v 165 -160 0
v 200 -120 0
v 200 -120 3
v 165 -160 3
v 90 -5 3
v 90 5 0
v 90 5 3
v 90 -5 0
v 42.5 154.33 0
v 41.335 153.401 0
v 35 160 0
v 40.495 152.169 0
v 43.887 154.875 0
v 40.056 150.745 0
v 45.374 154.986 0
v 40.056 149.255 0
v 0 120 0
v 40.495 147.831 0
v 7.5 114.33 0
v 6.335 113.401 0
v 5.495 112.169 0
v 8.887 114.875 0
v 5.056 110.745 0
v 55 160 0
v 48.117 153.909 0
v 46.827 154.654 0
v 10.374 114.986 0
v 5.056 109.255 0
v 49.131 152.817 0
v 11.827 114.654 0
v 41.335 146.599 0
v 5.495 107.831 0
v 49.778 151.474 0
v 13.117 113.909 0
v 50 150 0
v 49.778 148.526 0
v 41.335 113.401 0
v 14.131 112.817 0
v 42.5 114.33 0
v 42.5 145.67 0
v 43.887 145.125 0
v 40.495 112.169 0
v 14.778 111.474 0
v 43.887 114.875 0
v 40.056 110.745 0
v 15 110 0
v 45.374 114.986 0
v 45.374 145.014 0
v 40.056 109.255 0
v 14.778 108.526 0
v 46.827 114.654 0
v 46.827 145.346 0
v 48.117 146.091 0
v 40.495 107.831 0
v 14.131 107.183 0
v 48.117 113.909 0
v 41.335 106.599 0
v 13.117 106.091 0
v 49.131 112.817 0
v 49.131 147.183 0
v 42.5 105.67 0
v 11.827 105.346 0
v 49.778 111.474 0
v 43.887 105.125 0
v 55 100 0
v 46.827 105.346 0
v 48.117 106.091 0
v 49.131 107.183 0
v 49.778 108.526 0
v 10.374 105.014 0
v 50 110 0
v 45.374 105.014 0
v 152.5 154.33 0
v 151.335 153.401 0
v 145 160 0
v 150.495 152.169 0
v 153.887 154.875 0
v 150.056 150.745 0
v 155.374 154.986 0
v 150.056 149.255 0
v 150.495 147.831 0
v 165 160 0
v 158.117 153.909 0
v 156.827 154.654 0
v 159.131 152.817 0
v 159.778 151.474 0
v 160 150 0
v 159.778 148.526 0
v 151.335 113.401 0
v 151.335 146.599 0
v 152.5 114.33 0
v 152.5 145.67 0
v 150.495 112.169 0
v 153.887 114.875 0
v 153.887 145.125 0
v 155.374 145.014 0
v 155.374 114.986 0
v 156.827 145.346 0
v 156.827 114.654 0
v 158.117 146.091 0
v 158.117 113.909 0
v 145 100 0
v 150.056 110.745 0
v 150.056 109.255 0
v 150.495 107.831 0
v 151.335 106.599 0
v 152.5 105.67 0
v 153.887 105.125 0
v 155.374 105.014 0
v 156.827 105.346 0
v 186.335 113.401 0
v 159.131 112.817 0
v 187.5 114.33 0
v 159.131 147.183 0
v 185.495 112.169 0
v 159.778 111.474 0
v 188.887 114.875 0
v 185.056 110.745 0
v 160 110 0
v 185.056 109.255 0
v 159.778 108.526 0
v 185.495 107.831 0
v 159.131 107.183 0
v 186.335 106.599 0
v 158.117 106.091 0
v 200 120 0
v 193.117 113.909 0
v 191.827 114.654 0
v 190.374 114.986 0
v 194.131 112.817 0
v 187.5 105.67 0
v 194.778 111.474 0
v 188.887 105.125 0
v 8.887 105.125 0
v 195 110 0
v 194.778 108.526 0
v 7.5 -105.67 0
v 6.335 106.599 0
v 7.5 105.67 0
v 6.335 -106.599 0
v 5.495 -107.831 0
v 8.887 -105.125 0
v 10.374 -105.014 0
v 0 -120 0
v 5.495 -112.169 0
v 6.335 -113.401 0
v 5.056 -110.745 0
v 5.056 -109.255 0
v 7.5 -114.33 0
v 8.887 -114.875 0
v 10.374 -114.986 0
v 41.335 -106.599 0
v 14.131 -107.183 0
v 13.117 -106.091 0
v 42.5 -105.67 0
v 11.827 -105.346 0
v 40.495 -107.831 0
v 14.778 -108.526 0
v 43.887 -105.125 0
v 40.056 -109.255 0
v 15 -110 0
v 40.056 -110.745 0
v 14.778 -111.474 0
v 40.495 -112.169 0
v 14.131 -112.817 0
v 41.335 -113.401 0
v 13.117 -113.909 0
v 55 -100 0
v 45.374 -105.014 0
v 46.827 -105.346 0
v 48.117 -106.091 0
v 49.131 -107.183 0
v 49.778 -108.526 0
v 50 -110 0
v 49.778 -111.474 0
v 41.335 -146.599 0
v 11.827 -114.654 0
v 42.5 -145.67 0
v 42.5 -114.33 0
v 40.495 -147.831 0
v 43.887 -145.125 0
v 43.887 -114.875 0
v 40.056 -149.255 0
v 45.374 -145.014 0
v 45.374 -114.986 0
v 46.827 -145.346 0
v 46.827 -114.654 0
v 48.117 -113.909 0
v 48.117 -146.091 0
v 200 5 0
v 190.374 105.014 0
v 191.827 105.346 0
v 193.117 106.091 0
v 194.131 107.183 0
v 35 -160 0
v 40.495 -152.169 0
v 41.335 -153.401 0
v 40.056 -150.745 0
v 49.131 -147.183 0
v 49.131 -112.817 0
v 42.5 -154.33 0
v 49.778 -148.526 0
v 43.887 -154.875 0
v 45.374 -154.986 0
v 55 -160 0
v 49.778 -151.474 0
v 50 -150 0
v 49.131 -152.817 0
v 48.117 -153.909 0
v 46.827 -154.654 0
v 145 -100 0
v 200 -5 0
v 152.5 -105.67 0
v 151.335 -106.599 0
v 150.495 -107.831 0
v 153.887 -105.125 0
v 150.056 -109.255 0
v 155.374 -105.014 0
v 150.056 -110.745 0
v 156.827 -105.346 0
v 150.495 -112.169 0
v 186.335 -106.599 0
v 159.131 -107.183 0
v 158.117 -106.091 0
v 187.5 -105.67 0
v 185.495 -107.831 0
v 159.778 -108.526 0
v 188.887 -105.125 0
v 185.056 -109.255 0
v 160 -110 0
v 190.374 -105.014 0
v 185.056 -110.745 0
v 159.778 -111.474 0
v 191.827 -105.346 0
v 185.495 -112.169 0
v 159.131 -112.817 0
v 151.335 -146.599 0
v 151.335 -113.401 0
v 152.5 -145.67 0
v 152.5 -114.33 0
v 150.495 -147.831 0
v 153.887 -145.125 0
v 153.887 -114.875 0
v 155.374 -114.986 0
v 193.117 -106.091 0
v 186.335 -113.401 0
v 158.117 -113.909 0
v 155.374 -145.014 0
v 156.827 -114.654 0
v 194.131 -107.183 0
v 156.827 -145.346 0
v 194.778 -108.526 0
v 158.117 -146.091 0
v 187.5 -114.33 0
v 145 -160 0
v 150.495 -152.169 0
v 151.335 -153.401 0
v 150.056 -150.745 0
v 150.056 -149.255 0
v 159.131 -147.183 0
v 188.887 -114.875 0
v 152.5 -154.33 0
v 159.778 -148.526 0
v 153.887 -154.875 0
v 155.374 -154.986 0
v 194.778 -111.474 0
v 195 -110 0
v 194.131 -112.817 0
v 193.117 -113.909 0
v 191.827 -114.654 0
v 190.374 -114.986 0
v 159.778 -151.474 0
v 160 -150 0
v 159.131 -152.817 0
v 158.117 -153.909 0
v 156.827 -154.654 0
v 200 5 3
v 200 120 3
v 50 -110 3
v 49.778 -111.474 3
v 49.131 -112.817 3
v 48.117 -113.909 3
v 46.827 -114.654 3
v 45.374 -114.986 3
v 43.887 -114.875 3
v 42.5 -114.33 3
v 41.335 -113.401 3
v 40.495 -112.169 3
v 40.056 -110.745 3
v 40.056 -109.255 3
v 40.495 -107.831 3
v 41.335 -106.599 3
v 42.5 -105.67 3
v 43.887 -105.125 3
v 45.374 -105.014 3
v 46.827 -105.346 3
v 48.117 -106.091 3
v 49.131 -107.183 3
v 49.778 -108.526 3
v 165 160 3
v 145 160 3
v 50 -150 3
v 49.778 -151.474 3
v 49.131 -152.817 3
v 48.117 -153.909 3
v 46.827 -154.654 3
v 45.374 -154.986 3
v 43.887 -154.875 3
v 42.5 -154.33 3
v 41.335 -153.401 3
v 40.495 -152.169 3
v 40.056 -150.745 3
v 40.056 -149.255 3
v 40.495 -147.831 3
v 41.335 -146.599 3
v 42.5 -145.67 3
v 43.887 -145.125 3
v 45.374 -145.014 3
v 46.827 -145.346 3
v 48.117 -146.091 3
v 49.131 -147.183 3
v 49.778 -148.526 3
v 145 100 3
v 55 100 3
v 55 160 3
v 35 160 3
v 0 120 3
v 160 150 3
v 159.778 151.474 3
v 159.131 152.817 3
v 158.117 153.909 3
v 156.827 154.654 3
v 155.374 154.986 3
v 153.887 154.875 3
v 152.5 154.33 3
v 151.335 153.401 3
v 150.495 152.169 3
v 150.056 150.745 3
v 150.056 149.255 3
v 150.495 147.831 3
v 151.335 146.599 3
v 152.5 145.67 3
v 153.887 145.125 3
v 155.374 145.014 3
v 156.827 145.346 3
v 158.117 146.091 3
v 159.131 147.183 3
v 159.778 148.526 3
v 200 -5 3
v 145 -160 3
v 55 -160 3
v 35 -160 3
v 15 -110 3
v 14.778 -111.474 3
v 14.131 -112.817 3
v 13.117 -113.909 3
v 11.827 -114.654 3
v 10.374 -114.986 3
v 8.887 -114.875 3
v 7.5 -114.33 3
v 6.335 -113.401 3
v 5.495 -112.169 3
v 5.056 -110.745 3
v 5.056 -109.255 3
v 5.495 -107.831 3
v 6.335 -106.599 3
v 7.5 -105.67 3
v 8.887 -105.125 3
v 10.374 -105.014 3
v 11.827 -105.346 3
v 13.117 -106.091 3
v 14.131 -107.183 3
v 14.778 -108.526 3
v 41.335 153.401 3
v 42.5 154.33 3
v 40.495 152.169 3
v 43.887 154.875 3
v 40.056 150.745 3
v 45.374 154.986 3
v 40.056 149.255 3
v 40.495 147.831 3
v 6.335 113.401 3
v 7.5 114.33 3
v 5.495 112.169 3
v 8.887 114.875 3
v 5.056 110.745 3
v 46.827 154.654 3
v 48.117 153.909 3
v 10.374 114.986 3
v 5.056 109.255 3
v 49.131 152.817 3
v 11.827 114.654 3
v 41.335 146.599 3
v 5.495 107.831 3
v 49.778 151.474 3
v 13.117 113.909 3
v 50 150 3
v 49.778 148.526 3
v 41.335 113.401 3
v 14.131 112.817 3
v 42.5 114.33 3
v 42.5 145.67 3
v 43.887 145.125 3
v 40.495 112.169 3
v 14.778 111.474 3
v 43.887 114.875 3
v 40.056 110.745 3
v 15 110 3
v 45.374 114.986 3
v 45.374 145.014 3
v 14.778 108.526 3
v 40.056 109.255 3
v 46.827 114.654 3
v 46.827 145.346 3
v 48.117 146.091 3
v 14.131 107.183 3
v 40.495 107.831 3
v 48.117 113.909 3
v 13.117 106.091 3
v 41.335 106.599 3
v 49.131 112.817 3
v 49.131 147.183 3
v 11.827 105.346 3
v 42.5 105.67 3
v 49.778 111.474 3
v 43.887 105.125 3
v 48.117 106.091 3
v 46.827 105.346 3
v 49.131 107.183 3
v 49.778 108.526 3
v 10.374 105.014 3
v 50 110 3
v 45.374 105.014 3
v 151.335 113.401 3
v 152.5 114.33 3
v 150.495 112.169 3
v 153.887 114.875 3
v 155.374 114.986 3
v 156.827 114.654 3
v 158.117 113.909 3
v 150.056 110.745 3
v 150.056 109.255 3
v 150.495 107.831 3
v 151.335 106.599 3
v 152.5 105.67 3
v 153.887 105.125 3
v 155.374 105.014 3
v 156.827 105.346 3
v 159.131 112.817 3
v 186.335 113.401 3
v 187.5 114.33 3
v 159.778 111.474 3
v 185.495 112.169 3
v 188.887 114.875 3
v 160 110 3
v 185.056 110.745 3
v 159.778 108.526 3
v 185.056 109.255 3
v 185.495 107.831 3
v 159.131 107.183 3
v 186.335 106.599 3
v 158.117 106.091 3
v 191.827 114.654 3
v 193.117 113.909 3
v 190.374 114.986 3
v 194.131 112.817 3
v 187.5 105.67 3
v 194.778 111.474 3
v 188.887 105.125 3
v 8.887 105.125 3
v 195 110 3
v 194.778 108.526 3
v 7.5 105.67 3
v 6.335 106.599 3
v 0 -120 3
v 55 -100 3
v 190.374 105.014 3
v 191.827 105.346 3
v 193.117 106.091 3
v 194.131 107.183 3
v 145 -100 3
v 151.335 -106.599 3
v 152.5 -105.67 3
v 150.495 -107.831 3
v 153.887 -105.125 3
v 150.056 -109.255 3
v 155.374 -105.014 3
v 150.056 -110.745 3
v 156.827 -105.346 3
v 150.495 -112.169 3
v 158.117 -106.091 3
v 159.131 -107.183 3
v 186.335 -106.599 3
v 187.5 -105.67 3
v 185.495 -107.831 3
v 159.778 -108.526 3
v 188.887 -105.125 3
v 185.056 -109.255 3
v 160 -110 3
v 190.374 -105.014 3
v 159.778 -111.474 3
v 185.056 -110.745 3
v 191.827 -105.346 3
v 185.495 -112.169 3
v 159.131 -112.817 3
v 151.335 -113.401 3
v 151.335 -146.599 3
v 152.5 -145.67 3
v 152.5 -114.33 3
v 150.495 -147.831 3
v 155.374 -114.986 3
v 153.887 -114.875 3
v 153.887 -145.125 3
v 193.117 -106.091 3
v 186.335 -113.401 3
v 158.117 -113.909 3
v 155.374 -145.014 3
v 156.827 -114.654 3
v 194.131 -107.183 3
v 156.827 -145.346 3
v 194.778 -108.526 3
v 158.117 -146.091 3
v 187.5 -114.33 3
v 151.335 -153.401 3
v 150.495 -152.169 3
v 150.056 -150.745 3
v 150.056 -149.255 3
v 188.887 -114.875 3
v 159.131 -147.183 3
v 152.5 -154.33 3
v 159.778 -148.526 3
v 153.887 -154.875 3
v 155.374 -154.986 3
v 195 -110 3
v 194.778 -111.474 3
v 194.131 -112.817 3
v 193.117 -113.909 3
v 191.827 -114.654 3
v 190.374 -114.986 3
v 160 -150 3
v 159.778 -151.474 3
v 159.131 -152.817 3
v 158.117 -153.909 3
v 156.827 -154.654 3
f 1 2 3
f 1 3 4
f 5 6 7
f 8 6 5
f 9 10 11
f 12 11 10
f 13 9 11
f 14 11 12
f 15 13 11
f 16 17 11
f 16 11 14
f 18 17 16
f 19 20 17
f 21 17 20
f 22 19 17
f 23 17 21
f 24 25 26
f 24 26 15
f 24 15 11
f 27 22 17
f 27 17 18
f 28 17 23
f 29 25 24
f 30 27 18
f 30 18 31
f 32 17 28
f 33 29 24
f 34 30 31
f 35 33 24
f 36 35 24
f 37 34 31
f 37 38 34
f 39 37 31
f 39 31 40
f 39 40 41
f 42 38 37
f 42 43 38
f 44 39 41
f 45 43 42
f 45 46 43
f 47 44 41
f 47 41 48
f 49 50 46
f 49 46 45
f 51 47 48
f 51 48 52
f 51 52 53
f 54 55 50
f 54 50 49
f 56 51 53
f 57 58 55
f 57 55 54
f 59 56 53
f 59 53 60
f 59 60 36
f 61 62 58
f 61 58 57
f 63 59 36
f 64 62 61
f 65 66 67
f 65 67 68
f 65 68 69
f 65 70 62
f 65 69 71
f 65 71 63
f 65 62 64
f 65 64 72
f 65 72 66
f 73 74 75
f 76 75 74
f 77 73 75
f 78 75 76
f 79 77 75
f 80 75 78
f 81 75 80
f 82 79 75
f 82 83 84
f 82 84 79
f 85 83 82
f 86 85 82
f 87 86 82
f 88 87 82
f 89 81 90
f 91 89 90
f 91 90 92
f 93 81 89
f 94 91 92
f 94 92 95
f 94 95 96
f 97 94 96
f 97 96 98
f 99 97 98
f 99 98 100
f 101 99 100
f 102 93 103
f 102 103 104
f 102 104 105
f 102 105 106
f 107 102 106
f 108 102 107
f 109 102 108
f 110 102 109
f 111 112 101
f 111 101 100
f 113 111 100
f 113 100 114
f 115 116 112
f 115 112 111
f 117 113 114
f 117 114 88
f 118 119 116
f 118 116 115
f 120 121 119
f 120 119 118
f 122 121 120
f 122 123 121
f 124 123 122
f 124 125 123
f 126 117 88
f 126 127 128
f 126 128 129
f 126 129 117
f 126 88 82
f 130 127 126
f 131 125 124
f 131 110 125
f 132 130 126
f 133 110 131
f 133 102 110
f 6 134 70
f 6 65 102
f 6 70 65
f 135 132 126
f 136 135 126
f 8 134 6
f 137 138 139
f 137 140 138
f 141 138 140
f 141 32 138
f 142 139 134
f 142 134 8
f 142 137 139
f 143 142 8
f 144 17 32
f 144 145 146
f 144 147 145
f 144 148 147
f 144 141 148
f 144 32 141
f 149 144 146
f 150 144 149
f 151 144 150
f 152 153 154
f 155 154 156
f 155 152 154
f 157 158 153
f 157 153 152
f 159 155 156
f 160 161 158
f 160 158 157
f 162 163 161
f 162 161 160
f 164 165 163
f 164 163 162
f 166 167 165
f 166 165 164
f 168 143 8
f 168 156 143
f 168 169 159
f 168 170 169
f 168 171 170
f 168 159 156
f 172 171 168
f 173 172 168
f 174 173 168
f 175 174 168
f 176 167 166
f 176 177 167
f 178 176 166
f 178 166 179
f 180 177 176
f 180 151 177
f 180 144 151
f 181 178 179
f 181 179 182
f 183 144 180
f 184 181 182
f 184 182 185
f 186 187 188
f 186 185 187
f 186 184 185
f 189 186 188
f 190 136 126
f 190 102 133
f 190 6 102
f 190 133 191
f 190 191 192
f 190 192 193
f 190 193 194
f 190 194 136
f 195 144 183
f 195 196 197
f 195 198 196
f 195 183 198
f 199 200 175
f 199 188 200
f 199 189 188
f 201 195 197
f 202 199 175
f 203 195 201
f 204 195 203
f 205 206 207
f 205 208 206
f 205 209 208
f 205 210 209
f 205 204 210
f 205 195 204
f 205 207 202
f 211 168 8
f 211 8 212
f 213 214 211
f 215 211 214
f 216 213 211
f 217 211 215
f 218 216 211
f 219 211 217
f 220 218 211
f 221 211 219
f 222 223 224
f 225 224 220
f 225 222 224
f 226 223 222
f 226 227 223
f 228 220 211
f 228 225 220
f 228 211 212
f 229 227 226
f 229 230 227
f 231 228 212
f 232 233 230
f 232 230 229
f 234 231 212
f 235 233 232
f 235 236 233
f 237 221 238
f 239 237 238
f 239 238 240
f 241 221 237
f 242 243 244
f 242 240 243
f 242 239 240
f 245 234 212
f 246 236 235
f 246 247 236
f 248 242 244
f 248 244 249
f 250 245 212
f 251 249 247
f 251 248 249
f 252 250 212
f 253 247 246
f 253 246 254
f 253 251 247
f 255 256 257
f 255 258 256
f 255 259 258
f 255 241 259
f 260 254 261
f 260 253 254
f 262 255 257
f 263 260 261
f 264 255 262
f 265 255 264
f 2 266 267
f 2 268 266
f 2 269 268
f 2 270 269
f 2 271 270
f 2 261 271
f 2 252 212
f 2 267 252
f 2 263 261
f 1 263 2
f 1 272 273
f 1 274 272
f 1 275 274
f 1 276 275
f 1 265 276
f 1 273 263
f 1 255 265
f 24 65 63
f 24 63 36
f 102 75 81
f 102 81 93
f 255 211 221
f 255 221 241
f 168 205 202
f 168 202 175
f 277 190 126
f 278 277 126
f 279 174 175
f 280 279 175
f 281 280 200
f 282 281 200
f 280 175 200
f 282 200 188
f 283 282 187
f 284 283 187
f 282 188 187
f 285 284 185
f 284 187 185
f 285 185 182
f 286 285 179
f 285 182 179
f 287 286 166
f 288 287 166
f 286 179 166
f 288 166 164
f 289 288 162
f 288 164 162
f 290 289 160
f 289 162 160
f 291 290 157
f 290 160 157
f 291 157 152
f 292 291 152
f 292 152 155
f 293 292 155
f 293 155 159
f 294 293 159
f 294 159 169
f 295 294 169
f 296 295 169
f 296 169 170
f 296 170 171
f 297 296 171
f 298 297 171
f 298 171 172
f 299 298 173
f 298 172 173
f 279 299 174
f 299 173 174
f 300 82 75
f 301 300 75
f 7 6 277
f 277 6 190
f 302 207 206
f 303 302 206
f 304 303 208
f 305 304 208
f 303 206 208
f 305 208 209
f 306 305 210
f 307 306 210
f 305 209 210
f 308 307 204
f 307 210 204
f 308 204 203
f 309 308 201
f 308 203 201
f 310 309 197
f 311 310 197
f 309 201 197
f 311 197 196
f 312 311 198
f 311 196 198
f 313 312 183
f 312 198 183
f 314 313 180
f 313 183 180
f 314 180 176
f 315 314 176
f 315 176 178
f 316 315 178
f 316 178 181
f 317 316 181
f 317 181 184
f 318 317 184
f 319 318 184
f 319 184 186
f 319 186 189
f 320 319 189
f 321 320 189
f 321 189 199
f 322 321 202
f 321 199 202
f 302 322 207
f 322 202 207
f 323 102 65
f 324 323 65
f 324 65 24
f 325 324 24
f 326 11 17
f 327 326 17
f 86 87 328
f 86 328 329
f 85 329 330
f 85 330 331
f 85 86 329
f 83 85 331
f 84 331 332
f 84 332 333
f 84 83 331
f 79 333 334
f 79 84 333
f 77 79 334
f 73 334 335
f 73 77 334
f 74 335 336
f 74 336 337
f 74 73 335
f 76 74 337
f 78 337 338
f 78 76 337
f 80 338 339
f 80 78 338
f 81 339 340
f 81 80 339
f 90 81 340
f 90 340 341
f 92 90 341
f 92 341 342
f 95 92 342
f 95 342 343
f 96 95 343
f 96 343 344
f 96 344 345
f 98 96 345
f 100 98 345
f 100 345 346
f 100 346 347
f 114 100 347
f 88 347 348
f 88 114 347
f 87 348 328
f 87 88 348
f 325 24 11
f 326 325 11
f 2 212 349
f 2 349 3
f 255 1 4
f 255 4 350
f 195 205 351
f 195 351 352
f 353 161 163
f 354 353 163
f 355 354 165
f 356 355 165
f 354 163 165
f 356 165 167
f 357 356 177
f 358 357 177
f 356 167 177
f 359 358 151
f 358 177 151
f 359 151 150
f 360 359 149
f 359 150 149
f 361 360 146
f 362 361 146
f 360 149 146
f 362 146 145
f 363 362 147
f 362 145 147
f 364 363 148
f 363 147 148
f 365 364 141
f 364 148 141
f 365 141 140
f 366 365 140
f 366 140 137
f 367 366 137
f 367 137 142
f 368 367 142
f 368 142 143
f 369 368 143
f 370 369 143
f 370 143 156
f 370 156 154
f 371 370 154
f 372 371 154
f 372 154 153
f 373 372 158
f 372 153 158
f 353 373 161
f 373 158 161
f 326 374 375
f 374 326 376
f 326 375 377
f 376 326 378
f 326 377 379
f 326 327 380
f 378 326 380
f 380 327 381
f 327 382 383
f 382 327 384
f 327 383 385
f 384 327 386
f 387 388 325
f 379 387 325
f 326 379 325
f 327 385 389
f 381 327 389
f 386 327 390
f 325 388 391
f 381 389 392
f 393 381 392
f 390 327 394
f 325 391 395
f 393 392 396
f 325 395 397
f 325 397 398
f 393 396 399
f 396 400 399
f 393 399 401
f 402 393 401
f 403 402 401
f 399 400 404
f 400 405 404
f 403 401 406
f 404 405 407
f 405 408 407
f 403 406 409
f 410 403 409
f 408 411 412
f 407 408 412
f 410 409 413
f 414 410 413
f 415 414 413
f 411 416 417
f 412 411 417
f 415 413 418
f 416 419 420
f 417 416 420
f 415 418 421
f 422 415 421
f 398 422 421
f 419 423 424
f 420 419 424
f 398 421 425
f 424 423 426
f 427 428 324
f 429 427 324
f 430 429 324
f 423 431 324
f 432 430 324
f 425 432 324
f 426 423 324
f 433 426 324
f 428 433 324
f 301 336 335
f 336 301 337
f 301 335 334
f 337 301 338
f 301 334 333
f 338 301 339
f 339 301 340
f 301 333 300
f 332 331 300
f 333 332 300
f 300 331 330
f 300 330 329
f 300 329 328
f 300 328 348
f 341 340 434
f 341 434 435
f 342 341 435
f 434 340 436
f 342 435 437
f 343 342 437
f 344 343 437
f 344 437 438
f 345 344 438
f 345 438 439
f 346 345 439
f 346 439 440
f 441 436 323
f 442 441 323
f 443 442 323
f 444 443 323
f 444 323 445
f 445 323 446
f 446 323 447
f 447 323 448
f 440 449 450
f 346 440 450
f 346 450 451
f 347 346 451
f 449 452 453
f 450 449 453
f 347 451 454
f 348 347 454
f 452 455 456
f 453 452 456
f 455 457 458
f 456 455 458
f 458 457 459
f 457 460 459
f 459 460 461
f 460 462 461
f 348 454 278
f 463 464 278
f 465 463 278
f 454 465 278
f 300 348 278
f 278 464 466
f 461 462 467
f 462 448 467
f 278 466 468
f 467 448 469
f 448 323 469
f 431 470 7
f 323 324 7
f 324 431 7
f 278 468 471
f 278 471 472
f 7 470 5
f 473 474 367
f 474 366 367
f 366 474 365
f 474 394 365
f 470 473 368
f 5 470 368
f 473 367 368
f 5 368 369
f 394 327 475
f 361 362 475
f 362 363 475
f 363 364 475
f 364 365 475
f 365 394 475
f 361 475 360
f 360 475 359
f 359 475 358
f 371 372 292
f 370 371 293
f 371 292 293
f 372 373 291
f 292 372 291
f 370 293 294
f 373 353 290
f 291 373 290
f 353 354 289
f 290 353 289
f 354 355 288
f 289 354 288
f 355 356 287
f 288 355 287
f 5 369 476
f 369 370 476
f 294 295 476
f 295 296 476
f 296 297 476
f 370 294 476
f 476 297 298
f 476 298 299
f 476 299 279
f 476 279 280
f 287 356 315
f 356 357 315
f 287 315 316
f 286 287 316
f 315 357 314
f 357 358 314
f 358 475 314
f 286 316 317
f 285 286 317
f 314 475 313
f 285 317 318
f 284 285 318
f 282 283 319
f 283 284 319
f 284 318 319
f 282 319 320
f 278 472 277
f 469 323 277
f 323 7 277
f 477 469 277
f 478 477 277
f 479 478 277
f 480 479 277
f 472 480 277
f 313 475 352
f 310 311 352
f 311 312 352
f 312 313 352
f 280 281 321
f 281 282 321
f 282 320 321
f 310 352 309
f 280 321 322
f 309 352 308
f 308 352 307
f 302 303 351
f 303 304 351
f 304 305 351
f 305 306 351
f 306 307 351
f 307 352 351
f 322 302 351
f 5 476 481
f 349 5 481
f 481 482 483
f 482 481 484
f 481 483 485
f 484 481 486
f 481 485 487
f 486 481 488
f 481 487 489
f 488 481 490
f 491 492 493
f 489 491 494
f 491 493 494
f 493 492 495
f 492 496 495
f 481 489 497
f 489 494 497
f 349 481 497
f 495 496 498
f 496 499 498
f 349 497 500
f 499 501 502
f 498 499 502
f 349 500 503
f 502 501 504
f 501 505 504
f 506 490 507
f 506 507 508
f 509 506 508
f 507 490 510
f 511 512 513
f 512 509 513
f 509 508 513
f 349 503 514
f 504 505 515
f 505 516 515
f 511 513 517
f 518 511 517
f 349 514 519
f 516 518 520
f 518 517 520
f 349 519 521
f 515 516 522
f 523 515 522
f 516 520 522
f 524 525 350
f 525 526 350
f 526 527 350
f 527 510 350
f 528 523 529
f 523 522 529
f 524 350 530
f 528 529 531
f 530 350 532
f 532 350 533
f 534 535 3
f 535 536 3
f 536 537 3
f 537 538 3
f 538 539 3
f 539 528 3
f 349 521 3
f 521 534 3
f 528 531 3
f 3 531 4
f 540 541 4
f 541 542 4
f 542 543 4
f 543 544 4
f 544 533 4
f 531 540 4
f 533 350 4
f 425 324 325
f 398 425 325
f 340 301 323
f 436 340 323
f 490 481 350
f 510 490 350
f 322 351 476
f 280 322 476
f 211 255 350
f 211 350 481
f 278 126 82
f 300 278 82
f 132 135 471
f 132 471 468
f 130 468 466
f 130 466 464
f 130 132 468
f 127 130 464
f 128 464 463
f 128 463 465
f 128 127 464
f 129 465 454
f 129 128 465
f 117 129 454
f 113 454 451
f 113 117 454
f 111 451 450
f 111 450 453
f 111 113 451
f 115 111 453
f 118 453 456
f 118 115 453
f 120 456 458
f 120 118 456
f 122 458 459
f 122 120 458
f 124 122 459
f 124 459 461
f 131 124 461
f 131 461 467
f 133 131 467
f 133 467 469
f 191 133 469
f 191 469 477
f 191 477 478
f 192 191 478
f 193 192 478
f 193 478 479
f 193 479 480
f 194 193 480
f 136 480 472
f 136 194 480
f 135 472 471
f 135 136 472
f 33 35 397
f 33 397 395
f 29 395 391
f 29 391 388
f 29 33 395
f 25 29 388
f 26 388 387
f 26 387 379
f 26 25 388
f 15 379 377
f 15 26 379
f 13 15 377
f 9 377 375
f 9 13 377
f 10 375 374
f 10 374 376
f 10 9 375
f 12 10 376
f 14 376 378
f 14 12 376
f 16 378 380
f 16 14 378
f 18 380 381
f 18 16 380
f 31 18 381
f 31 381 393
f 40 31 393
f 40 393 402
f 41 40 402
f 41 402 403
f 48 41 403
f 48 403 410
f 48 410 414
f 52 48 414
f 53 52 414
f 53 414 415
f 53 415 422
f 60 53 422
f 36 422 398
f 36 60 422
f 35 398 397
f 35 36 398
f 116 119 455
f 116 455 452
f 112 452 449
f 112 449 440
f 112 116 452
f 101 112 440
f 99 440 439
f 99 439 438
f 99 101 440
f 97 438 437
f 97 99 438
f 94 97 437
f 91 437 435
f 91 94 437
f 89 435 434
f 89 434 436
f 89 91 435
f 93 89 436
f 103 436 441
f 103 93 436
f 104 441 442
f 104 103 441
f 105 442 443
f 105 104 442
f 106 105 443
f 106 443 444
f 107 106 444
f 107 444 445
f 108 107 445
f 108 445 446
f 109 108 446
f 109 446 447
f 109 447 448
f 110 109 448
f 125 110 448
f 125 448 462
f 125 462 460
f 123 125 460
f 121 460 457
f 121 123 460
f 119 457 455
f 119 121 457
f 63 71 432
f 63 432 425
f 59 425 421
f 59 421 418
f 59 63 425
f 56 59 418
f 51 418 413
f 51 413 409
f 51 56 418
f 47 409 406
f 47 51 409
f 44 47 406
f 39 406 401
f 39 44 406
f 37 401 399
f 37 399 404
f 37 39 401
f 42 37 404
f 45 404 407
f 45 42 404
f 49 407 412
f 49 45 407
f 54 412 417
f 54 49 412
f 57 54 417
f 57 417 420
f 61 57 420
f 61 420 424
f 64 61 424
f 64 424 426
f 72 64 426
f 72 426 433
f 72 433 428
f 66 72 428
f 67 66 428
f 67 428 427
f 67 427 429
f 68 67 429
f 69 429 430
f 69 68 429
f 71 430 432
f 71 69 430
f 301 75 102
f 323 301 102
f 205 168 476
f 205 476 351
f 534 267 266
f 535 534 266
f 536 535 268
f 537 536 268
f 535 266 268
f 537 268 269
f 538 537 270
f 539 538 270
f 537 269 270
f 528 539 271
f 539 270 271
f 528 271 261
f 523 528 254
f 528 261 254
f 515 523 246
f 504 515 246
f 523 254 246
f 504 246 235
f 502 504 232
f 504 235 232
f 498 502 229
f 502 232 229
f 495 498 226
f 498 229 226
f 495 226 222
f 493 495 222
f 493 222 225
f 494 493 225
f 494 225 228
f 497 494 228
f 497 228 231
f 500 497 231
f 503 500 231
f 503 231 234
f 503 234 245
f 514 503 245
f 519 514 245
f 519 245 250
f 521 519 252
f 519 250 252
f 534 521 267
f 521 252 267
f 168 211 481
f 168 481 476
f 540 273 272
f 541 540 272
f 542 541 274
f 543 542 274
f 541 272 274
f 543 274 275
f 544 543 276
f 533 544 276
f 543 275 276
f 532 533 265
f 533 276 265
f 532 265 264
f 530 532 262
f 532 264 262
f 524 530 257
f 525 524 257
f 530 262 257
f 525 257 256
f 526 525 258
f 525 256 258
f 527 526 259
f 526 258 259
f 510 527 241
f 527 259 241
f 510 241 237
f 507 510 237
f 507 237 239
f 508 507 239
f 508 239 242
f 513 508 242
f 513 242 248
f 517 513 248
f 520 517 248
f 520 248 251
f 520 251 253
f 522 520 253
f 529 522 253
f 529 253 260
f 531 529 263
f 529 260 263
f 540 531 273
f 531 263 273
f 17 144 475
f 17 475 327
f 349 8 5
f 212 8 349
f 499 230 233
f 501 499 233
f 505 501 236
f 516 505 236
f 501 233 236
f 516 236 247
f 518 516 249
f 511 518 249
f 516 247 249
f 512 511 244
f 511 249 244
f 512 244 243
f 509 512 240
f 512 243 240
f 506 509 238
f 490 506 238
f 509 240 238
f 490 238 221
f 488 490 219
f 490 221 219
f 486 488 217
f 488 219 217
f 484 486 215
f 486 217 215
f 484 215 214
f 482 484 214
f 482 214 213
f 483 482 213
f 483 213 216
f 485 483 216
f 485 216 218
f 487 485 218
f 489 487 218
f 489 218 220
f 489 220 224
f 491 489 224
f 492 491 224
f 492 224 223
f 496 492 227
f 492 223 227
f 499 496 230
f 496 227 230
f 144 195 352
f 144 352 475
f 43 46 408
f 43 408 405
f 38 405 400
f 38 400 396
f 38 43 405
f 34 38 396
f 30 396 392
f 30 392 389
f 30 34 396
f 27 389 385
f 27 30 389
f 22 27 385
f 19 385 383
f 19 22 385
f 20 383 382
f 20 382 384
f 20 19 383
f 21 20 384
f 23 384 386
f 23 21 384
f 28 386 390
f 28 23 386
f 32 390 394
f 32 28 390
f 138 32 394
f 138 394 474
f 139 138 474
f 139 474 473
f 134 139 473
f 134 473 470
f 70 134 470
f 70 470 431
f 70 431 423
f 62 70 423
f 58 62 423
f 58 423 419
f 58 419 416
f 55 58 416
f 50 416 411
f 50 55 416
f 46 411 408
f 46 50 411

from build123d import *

# Parameters (mm, degrees)
ESQUISSE1_R        = 5
BOSS_EXTRU_1_DEPTH = 3


with BuildPart() as part:
    # Esquisse1 → Boss.-Extru.1 (new body)
    # profile 1 of 3: a face of its own
    with BuildSketch(Plane.XY):
        Polygon((0, 120), (0, 100), (55, 100), (55, 160), (35, 160), align=None)
        with Locations((10, 110)):
            Circle(ESQUISSE1_R, mode=Mode.SUBTRACT)
        with Locations((45, 110)):
            Circle(ESQUISSE1_R, mode=Mode.SUBTRACT)
        with Locations((45, 150)):
            Circle(ESQUISSE1_R, mode=Mode.SUBTRACT)
    # profile 2 of 3: a face of its own
    with BuildSketch(Plane.XY):
        Polygon((55, 100), (0, 100), (0, 0), (90, 0), (90, 5), (200, 5), (200, 80), (200, 100), (145, 100), align=None)
    # profile 3 of 3: a face of its own
    with BuildSketch(Plane.XY):
        Polygon((145, 160), (145, 100), (200, 100), (200, 120), (165, 160), align=None)
        with Locations((155, 110)):
            Circle(ESQUISSE1_R, mode=Mode.SUBTRACT)
        with Locations((190, 110)):
            Circle(ESQUISSE1_R, mode=Mode.SUBTRACT)
        with Locations((155, 150)):
            Circle(ESQUISSE1_R, mode=Mode.SUBTRACT)
    boss_extru_1 = extrude(amount=BOSS_EXTRU_1_DEPTH)

    # Symétrie1: Boss.-Extru.1 across plane
    add(boss_extru_1.mirror(Plane(origin=(0, 0, 3), x_dir=(0, 0, 1), z_dir=(0, 1, 0))))


solid = part.part
